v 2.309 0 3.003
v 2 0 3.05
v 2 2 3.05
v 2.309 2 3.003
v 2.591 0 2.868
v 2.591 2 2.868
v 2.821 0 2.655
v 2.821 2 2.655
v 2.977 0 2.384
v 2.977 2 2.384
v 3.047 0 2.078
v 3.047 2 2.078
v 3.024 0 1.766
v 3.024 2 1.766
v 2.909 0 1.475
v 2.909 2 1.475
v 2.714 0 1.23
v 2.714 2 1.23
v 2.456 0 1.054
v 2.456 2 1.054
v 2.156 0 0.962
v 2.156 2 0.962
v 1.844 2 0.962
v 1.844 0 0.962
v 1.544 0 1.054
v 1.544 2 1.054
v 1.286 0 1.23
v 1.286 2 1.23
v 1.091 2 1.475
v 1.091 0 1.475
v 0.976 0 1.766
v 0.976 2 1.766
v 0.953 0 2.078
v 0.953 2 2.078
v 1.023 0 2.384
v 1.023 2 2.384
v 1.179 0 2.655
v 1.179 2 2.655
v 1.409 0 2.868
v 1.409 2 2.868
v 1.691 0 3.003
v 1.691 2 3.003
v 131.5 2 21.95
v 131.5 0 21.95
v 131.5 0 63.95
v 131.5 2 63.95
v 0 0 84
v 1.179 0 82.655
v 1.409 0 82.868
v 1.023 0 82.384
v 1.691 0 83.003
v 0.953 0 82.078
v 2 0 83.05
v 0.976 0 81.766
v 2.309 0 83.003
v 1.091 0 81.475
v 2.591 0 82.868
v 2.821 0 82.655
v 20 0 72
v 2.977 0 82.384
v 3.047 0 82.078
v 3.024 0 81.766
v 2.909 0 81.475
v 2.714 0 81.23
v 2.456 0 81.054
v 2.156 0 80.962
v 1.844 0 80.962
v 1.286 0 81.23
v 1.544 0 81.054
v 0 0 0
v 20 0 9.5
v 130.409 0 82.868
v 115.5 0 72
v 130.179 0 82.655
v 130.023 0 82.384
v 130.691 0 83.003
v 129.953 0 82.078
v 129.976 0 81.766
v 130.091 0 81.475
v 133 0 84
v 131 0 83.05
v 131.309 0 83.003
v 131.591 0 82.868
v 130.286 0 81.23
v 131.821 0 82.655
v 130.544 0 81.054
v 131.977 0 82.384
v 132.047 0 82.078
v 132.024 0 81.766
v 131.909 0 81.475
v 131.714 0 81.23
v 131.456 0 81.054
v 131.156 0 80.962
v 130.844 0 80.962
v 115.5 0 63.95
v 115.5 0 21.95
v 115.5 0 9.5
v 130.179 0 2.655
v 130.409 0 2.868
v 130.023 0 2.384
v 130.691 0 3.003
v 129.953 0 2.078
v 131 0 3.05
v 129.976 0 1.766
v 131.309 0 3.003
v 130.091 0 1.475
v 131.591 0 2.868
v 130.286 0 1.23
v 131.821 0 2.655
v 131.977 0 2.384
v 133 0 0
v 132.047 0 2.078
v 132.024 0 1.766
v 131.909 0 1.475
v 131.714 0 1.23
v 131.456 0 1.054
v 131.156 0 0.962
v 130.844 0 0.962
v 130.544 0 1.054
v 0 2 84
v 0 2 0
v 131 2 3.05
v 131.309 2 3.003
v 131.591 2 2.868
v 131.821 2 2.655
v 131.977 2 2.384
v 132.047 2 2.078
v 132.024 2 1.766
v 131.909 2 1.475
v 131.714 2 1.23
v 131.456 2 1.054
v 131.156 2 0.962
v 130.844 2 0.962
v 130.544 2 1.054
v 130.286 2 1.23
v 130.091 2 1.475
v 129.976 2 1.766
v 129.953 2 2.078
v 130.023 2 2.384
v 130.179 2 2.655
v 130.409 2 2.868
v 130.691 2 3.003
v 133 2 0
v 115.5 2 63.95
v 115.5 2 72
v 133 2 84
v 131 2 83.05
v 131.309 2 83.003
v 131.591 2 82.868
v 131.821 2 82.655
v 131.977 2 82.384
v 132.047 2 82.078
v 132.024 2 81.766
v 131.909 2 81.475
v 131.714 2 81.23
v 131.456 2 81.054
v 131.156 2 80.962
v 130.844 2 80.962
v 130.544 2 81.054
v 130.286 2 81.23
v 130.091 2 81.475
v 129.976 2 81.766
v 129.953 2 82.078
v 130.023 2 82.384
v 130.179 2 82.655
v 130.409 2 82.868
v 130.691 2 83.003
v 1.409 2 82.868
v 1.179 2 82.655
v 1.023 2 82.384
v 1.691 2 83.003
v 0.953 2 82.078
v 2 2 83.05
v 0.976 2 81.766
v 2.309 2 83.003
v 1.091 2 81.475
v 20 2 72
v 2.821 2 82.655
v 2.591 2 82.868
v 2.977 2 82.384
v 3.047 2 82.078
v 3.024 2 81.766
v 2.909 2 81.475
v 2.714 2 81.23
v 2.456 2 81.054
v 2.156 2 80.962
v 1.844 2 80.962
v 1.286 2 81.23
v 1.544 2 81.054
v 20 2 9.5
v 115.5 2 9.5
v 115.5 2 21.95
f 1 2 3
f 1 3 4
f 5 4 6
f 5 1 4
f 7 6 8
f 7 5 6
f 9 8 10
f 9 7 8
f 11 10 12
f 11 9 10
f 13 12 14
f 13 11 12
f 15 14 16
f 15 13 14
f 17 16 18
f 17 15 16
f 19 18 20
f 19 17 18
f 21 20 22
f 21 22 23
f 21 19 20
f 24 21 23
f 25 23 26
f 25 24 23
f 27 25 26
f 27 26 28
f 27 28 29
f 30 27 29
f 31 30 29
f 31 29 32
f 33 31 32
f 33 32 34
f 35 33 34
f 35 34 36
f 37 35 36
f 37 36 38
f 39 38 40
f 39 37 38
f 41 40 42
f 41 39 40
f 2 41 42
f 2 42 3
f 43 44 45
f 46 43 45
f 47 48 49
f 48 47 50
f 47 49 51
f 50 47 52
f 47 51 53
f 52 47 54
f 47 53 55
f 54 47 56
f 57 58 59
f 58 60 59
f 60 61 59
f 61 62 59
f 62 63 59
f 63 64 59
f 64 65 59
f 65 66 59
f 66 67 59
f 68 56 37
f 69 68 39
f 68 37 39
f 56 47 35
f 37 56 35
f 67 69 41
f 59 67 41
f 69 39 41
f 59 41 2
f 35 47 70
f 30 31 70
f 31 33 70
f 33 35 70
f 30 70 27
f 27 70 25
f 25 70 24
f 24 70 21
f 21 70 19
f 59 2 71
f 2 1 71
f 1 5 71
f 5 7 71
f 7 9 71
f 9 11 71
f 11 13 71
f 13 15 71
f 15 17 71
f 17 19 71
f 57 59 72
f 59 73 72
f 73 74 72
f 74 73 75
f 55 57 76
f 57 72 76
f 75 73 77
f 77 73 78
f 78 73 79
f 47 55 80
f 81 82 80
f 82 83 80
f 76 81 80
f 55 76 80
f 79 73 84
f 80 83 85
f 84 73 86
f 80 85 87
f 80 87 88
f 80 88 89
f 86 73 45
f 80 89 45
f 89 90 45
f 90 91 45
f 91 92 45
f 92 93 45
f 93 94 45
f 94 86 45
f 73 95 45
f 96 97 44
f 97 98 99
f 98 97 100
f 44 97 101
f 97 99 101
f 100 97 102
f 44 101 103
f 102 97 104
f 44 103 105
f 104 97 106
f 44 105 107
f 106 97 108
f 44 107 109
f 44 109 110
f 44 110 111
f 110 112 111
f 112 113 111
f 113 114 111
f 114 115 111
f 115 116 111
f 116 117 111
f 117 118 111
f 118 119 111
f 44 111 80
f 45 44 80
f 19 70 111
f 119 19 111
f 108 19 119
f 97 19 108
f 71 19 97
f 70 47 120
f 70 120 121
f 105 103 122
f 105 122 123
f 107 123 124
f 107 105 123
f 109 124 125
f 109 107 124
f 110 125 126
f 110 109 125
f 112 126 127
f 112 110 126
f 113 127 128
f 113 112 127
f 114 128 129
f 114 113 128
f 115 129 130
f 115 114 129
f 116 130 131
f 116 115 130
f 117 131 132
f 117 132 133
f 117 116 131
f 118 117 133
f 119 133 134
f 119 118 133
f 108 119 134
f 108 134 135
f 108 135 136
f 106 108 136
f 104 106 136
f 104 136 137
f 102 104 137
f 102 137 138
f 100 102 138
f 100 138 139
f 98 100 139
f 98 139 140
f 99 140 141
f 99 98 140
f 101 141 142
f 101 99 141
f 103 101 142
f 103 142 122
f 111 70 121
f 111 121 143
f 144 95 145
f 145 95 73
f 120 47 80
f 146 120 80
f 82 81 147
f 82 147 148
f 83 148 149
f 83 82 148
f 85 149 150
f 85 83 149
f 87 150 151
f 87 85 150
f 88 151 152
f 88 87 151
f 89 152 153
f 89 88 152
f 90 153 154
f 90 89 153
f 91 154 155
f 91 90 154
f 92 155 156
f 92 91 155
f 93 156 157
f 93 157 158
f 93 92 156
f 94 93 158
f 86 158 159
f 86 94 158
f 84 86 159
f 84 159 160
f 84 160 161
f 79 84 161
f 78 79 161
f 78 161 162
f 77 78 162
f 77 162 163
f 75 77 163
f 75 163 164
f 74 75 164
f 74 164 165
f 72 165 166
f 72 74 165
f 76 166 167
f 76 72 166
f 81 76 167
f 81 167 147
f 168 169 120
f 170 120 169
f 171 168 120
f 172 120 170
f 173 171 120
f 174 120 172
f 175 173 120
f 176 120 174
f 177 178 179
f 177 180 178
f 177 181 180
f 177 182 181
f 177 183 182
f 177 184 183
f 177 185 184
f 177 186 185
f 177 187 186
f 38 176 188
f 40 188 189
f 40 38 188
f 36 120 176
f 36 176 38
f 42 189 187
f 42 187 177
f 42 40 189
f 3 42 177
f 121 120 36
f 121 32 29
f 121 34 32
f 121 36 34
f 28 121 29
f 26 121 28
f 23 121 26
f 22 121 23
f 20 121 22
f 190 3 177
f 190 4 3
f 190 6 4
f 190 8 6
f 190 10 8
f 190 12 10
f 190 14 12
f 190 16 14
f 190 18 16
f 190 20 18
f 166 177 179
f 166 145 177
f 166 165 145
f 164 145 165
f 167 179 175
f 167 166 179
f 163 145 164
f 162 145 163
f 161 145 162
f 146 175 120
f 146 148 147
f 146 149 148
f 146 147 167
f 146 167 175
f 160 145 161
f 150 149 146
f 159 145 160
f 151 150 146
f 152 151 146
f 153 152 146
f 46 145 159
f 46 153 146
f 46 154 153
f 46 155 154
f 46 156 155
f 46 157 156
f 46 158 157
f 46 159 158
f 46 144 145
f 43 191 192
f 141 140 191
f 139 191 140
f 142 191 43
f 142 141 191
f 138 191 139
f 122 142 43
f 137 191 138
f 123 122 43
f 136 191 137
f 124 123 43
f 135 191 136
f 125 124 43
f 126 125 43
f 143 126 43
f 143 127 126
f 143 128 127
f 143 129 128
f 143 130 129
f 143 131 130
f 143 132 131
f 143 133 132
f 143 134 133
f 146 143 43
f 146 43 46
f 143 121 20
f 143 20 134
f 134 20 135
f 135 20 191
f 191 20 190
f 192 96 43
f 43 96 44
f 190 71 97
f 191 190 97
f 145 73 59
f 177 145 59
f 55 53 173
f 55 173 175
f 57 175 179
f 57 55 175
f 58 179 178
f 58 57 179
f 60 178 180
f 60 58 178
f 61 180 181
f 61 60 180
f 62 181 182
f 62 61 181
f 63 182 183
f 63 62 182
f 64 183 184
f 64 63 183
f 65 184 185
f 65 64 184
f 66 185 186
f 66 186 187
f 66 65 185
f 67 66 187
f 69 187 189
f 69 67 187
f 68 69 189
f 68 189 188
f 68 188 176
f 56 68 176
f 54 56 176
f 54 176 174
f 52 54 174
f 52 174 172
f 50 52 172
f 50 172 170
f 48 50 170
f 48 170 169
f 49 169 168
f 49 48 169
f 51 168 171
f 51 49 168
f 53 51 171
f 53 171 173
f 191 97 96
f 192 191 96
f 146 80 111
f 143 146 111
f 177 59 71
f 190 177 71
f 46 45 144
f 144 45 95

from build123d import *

# Parameters (mm, degrees)
SKETCH_1_W      = 133
SKETCH_1_H      = 84
SKETCH_1_R      = 1.05
EXTRUDE_1_DEPTH = 2


with BuildPart() as part:
    # 草图1 → 凸台-拉伸1 (new body)
    with BuildSketch(Plane(origin=(0, 0, 0), x_dir=(1, 0, 0), z_dir=(0, 1, 0))):
        with Locations((66.5, -42)):
            Rectangle(SKETCH_1_W, SKETCH_1_H)
        with Locations(Location((2, -82, 0), (0, 0, 270))):
            Circle(SKETCH_1_R, mode=Mode.SUBTRACT)
        with Locations(Location((131, -82, 0), (0, 0, 270))):
            Circle(SKETCH_1_R, mode=Mode.SUBTRACT)
        with Locations(Location((2, -2, 0), (0, 0, 270))):
            Circle(SKETCH_1_R, mode=Mode.SUBTRACT)
        Polygon((20, -72), (20, -9.5), (115.5, -9.5), (115.5, -21.95), (131.5, -21.95), (131.5, -63.95), (115.5, -63.95), (115.5, -72), align=None, mode=Mode.SUBTRACT)
        with Locations(Location((131, -2, 0), (0, 0, 270))):
            Circle(SKETCH_1_R, mode=Mode.SUBTRACT)
    extrude(amount=EXTRUDE_1_DEPTH)


solid = part.part
